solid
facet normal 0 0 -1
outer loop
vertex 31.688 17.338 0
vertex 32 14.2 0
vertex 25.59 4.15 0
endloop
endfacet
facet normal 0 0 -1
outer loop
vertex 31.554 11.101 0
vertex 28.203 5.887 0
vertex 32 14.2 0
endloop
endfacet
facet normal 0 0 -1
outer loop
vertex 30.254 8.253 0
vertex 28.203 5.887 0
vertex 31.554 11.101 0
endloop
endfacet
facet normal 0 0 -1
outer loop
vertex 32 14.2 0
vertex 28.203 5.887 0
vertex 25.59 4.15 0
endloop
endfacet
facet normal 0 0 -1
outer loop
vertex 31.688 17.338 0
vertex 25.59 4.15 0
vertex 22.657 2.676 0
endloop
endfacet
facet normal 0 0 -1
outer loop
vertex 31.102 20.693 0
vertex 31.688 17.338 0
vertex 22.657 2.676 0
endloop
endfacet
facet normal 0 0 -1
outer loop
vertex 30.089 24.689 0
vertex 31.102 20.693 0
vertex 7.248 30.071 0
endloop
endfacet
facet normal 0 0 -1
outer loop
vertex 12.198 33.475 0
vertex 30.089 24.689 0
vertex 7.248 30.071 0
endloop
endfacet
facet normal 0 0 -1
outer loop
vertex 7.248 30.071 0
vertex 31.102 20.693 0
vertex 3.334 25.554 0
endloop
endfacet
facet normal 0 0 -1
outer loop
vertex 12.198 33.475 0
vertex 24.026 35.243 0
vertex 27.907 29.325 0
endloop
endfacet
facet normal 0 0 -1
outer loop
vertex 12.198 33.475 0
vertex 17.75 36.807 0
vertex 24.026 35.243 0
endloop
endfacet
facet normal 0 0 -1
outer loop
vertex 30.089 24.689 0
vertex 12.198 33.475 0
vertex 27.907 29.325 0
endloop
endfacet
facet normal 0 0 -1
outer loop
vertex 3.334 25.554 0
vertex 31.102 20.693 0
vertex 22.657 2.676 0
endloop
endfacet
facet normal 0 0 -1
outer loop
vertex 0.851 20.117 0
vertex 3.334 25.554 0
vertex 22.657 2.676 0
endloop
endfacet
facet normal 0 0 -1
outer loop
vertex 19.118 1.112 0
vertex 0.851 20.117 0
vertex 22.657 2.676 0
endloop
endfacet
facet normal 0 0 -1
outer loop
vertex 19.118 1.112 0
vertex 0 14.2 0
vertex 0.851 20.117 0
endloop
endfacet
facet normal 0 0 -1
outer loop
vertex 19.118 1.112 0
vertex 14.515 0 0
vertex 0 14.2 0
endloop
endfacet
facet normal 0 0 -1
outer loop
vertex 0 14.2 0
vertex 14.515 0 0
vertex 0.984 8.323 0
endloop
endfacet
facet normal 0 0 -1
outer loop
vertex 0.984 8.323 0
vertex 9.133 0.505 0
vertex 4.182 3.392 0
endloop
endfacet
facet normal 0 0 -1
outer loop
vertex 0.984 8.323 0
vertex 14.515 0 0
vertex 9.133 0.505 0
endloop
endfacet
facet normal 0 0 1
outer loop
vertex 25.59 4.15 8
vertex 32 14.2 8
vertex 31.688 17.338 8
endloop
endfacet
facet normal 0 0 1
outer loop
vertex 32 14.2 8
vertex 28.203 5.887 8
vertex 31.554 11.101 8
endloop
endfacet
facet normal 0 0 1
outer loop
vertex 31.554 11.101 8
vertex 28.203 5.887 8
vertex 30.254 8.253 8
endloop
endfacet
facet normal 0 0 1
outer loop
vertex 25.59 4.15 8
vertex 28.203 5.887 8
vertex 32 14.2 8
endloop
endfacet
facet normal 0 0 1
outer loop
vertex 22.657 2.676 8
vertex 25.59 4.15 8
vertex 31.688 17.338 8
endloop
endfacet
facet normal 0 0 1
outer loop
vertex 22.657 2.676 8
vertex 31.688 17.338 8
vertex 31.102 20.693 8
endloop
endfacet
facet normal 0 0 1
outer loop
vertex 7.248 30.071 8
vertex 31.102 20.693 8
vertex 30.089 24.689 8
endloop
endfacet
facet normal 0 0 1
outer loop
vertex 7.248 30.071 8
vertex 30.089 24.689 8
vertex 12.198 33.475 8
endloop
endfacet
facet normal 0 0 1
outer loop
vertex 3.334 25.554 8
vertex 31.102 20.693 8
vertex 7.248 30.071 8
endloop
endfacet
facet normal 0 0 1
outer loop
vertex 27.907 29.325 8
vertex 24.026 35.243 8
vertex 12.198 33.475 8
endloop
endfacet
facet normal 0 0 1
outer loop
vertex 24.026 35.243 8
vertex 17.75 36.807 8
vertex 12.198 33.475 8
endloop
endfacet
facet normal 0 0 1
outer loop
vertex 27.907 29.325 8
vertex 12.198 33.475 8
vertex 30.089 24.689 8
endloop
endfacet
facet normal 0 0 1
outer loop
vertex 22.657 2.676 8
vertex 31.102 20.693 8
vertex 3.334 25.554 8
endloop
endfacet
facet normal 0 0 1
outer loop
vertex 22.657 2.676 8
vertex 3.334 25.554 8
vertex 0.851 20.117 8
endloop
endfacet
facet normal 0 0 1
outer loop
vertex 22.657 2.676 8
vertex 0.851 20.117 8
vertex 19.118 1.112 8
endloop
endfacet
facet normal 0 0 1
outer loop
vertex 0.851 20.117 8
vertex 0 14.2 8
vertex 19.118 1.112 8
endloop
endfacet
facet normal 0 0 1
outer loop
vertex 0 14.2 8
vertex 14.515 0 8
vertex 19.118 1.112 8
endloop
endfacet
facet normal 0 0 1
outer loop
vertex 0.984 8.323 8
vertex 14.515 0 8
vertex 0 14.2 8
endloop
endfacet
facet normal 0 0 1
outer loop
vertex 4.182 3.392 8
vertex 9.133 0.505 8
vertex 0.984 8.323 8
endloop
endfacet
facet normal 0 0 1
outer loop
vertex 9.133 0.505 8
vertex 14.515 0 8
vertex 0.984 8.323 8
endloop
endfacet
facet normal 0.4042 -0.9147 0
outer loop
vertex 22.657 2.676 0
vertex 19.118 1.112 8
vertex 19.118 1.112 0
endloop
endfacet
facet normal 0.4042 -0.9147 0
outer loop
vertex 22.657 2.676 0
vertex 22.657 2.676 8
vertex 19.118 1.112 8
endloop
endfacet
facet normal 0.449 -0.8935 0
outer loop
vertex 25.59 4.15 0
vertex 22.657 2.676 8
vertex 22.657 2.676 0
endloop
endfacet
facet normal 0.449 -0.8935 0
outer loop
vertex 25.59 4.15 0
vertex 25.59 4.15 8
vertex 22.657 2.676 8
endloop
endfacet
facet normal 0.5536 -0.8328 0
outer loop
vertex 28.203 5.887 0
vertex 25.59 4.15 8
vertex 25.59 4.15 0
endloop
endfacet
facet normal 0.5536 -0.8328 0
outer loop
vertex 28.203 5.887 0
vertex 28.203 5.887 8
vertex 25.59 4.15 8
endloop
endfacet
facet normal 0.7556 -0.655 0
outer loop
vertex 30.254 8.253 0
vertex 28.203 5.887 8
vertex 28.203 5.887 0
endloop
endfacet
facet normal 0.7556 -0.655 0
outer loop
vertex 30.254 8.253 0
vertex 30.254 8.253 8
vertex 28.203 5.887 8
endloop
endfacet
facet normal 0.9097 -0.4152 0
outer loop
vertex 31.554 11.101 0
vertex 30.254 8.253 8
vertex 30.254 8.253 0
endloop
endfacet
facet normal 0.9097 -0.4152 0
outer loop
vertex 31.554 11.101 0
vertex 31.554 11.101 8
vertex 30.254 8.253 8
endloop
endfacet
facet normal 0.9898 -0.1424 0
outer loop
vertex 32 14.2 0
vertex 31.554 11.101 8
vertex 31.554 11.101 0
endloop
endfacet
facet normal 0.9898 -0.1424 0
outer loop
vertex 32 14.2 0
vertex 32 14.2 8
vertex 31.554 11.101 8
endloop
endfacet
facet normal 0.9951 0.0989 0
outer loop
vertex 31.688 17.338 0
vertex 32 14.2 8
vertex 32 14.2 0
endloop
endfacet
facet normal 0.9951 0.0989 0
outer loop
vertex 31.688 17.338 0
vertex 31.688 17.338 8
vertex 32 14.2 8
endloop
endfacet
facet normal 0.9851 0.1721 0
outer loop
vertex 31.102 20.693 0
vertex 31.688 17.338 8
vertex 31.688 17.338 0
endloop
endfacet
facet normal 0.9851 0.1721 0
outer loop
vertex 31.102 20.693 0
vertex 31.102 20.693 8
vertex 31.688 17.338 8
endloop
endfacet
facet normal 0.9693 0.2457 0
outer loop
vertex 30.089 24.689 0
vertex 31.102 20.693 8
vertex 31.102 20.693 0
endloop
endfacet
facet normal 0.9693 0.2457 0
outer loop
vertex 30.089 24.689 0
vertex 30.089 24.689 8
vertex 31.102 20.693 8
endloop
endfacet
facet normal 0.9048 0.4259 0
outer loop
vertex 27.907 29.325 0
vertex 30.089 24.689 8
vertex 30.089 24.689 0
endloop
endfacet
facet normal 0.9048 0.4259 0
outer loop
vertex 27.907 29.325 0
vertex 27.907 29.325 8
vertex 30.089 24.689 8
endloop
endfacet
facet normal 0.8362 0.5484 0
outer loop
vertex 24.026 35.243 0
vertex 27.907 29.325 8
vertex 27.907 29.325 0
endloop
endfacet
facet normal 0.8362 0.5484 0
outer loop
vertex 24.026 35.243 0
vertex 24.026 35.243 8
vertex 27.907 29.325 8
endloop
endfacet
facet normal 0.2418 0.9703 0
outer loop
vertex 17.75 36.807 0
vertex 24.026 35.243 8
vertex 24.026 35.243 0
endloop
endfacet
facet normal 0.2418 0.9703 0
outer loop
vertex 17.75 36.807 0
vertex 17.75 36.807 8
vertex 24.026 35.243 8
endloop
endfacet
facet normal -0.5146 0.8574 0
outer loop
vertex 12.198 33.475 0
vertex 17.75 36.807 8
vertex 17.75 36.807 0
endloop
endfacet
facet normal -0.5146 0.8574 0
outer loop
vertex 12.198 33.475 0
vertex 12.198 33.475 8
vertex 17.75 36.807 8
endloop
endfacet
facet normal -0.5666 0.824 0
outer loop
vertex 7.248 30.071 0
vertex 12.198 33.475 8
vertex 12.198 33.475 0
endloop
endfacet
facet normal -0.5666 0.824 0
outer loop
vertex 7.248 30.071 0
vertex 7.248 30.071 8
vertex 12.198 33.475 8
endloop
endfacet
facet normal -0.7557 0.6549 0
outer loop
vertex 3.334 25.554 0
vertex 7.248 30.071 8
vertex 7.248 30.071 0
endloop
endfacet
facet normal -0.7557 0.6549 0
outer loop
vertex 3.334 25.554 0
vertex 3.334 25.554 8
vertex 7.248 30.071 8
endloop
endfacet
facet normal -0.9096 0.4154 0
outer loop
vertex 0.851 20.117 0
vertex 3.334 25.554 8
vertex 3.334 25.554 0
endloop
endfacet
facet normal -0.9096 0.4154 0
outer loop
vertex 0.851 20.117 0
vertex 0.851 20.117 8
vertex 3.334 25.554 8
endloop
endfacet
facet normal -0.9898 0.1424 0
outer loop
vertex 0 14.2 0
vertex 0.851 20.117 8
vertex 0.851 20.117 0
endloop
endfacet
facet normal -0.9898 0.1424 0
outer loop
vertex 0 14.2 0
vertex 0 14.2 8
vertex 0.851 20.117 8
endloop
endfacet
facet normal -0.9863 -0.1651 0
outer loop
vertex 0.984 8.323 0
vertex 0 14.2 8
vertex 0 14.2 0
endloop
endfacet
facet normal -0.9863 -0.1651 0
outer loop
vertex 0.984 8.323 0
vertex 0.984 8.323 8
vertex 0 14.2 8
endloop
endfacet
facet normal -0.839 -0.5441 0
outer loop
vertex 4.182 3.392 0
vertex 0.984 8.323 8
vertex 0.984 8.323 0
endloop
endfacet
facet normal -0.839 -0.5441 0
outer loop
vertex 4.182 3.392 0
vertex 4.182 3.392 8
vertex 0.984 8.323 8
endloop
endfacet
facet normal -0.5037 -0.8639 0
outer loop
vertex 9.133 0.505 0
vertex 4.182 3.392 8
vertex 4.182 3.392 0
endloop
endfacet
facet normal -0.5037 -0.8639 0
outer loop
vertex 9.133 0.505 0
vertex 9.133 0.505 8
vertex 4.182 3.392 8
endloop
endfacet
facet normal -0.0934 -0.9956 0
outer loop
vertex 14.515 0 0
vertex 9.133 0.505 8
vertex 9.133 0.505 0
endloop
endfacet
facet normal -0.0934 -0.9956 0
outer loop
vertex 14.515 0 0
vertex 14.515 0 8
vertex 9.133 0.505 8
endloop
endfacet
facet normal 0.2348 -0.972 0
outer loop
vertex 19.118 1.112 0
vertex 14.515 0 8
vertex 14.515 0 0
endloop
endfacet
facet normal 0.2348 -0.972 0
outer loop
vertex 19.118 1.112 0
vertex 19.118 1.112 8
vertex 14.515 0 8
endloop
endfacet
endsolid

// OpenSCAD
$fn = 32;

// ----------------------------------------------------------------------
// Cam disc: base radius 11.0 mm, lift 10.0 mm, 22 profile points
// ----------------------------------------------------------------------

// --- parameters (mm) ---
profile_height = 8;       // extrusion height
profile_points = 22;      // points of the closed outline

profile = [[32, 14.2], [31.688, 17.338], [31.102, 20.693], [30.089, 24.689], [27.907, 29.325], [24.026, 35.243], [17.75, 36.807], [12.198, 33.475], [7.248, 30.071], [3.334, 25.554], [0.851, 20.117], [0, 14.2], [0.984, 8.323], [4.182, 3.392], [9.133, 0.505], [14.515, 0], [19.118, 1.112], [22.657, 2.676], [25.59, 4.15], [28.203, 5.887], [30.254, 8.253], [31.554, 11.101]];  // single closed polygon, 22 points, counter clockwise

// --- the one profile operation ---
linear_extrude(height = profile_height) polygon(points = profile);
